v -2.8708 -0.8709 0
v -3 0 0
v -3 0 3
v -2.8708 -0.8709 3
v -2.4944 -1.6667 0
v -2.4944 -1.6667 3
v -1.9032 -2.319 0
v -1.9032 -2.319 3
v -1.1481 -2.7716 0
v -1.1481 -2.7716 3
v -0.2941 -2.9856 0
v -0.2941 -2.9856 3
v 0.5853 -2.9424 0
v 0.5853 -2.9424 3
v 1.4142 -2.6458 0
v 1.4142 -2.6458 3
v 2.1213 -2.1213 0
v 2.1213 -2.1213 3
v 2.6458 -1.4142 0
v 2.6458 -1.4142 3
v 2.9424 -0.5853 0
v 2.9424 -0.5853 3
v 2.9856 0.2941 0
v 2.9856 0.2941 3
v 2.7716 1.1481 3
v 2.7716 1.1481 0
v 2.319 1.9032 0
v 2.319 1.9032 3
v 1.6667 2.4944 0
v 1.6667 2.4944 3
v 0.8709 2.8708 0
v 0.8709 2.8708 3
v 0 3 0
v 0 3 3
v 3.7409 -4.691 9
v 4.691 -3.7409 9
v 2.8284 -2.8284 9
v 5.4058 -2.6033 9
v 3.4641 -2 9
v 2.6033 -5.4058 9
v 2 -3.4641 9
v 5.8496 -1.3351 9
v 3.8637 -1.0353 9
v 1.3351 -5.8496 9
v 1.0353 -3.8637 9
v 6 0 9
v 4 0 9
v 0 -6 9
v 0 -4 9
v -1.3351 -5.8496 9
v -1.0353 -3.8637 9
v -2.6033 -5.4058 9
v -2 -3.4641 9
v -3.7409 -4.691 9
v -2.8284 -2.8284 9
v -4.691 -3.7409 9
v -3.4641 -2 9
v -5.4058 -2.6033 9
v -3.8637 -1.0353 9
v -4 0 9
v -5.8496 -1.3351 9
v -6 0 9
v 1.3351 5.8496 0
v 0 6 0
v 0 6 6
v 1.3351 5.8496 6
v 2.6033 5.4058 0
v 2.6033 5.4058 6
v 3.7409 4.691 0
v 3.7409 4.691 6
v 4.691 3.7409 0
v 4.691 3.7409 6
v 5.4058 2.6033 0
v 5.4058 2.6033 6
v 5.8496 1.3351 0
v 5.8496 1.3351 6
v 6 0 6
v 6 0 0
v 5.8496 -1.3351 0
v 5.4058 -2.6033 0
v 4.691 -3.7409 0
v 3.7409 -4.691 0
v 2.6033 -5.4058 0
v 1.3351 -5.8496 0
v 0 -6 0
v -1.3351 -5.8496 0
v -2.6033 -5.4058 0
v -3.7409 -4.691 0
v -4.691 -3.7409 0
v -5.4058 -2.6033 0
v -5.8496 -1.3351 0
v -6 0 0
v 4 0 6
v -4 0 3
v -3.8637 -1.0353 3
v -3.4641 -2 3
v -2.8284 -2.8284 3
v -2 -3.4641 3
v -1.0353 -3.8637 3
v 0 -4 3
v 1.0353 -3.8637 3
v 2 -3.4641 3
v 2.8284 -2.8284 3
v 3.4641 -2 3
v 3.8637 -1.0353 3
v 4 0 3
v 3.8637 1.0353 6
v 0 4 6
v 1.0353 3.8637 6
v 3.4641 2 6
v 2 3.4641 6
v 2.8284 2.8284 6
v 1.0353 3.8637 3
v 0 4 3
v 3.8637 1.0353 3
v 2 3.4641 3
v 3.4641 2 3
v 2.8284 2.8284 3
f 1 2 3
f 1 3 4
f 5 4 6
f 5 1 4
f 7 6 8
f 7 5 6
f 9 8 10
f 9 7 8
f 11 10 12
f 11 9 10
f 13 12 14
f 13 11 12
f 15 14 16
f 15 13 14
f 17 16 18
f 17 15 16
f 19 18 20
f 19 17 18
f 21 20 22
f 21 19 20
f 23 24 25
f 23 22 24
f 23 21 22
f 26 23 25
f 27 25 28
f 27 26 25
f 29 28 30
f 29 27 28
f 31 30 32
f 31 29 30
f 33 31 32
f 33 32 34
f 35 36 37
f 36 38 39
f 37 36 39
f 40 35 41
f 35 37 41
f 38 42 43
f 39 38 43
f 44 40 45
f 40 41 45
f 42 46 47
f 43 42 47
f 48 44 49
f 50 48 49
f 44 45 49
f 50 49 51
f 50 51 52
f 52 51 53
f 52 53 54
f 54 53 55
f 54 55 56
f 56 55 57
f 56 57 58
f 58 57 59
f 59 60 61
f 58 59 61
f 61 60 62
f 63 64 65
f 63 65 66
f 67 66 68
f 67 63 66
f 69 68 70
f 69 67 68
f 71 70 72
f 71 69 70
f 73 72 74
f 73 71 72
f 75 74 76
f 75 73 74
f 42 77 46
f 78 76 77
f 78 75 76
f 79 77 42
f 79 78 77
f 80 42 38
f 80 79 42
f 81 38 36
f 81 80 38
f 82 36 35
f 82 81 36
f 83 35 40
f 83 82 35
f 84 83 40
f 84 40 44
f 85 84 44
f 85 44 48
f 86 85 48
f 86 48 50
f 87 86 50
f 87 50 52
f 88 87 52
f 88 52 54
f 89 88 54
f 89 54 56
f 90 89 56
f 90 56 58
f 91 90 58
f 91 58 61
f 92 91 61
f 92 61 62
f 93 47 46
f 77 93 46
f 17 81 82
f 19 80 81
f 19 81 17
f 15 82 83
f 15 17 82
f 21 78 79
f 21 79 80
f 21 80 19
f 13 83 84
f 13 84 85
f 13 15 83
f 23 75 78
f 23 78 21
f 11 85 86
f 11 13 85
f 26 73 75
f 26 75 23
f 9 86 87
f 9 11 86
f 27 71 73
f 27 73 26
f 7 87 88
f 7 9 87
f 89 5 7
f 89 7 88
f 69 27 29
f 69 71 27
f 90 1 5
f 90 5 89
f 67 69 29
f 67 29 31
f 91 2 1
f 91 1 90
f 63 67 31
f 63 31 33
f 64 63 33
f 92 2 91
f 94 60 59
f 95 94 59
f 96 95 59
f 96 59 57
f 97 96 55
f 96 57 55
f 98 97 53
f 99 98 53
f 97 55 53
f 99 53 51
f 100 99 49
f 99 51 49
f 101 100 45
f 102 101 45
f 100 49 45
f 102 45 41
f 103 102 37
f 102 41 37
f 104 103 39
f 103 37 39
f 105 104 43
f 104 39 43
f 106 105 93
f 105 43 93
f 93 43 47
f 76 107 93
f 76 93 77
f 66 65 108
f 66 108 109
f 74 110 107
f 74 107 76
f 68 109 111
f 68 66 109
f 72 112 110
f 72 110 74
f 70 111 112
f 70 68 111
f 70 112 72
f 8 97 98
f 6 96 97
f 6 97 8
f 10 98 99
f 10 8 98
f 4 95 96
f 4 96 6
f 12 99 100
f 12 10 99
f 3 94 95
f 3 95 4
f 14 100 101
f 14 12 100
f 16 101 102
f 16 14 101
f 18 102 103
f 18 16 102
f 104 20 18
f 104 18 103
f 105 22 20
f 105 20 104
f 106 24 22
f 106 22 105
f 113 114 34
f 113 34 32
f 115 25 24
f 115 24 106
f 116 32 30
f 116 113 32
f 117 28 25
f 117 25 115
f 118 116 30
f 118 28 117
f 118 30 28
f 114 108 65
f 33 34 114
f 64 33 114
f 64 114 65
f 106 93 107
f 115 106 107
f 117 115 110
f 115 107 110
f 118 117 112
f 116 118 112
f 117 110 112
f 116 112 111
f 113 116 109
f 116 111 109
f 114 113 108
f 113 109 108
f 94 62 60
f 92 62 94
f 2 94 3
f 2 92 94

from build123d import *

# Parameters (mm, degrees)
BOSS_EXTRUDE1_DEPTH = 9
SKETCH2_W           = 6
SKETCH2_H           = 6
CUT_EXTRUDE1_DEPTH  = 3
SKETCH3_R           = 4
CUT_EXTRUDE2_DEPTH  = 6


with BuildPart() as part:
    # Sketch1 → Boss-Extrude1 (new body)
    with BuildSketch(Plane.XY):
        with BuildLine():
            Line((-6, 0), (-3, 0))
            ThreePointArc((-3, 0), (2.121320344, -2.121320344), (0, 3))
            Line((0, 3), (0, 6))
            ThreePointArc((0, 6), (4.242640687, -4.242640687), (-6, 0))
        make_face()
    extrude(amount=BOSS_EXTRUDE1_DEPTH)

    # Sketch2 → Cut-Extrude1 (cut)
    with BuildSketch(Plane.XY.offset(9)):
        with Locations((3, 3)):
            Rectangle(SKETCH2_W, SKETCH2_H)
    extrude(amount=-CUT_EXTRUDE1_DEPTH, mode=Mode.SUBTRACT)

    # Sketch3 → Cut-Extrude2 (cut)
    with BuildSketch(Plane.XY.offset(9)):
        Circle(SKETCH3_R)
    extrude(amount=-CUT_EXTRUDE2_DEPTH, mode=Mode.SUBTRACT)


solid = part.part
